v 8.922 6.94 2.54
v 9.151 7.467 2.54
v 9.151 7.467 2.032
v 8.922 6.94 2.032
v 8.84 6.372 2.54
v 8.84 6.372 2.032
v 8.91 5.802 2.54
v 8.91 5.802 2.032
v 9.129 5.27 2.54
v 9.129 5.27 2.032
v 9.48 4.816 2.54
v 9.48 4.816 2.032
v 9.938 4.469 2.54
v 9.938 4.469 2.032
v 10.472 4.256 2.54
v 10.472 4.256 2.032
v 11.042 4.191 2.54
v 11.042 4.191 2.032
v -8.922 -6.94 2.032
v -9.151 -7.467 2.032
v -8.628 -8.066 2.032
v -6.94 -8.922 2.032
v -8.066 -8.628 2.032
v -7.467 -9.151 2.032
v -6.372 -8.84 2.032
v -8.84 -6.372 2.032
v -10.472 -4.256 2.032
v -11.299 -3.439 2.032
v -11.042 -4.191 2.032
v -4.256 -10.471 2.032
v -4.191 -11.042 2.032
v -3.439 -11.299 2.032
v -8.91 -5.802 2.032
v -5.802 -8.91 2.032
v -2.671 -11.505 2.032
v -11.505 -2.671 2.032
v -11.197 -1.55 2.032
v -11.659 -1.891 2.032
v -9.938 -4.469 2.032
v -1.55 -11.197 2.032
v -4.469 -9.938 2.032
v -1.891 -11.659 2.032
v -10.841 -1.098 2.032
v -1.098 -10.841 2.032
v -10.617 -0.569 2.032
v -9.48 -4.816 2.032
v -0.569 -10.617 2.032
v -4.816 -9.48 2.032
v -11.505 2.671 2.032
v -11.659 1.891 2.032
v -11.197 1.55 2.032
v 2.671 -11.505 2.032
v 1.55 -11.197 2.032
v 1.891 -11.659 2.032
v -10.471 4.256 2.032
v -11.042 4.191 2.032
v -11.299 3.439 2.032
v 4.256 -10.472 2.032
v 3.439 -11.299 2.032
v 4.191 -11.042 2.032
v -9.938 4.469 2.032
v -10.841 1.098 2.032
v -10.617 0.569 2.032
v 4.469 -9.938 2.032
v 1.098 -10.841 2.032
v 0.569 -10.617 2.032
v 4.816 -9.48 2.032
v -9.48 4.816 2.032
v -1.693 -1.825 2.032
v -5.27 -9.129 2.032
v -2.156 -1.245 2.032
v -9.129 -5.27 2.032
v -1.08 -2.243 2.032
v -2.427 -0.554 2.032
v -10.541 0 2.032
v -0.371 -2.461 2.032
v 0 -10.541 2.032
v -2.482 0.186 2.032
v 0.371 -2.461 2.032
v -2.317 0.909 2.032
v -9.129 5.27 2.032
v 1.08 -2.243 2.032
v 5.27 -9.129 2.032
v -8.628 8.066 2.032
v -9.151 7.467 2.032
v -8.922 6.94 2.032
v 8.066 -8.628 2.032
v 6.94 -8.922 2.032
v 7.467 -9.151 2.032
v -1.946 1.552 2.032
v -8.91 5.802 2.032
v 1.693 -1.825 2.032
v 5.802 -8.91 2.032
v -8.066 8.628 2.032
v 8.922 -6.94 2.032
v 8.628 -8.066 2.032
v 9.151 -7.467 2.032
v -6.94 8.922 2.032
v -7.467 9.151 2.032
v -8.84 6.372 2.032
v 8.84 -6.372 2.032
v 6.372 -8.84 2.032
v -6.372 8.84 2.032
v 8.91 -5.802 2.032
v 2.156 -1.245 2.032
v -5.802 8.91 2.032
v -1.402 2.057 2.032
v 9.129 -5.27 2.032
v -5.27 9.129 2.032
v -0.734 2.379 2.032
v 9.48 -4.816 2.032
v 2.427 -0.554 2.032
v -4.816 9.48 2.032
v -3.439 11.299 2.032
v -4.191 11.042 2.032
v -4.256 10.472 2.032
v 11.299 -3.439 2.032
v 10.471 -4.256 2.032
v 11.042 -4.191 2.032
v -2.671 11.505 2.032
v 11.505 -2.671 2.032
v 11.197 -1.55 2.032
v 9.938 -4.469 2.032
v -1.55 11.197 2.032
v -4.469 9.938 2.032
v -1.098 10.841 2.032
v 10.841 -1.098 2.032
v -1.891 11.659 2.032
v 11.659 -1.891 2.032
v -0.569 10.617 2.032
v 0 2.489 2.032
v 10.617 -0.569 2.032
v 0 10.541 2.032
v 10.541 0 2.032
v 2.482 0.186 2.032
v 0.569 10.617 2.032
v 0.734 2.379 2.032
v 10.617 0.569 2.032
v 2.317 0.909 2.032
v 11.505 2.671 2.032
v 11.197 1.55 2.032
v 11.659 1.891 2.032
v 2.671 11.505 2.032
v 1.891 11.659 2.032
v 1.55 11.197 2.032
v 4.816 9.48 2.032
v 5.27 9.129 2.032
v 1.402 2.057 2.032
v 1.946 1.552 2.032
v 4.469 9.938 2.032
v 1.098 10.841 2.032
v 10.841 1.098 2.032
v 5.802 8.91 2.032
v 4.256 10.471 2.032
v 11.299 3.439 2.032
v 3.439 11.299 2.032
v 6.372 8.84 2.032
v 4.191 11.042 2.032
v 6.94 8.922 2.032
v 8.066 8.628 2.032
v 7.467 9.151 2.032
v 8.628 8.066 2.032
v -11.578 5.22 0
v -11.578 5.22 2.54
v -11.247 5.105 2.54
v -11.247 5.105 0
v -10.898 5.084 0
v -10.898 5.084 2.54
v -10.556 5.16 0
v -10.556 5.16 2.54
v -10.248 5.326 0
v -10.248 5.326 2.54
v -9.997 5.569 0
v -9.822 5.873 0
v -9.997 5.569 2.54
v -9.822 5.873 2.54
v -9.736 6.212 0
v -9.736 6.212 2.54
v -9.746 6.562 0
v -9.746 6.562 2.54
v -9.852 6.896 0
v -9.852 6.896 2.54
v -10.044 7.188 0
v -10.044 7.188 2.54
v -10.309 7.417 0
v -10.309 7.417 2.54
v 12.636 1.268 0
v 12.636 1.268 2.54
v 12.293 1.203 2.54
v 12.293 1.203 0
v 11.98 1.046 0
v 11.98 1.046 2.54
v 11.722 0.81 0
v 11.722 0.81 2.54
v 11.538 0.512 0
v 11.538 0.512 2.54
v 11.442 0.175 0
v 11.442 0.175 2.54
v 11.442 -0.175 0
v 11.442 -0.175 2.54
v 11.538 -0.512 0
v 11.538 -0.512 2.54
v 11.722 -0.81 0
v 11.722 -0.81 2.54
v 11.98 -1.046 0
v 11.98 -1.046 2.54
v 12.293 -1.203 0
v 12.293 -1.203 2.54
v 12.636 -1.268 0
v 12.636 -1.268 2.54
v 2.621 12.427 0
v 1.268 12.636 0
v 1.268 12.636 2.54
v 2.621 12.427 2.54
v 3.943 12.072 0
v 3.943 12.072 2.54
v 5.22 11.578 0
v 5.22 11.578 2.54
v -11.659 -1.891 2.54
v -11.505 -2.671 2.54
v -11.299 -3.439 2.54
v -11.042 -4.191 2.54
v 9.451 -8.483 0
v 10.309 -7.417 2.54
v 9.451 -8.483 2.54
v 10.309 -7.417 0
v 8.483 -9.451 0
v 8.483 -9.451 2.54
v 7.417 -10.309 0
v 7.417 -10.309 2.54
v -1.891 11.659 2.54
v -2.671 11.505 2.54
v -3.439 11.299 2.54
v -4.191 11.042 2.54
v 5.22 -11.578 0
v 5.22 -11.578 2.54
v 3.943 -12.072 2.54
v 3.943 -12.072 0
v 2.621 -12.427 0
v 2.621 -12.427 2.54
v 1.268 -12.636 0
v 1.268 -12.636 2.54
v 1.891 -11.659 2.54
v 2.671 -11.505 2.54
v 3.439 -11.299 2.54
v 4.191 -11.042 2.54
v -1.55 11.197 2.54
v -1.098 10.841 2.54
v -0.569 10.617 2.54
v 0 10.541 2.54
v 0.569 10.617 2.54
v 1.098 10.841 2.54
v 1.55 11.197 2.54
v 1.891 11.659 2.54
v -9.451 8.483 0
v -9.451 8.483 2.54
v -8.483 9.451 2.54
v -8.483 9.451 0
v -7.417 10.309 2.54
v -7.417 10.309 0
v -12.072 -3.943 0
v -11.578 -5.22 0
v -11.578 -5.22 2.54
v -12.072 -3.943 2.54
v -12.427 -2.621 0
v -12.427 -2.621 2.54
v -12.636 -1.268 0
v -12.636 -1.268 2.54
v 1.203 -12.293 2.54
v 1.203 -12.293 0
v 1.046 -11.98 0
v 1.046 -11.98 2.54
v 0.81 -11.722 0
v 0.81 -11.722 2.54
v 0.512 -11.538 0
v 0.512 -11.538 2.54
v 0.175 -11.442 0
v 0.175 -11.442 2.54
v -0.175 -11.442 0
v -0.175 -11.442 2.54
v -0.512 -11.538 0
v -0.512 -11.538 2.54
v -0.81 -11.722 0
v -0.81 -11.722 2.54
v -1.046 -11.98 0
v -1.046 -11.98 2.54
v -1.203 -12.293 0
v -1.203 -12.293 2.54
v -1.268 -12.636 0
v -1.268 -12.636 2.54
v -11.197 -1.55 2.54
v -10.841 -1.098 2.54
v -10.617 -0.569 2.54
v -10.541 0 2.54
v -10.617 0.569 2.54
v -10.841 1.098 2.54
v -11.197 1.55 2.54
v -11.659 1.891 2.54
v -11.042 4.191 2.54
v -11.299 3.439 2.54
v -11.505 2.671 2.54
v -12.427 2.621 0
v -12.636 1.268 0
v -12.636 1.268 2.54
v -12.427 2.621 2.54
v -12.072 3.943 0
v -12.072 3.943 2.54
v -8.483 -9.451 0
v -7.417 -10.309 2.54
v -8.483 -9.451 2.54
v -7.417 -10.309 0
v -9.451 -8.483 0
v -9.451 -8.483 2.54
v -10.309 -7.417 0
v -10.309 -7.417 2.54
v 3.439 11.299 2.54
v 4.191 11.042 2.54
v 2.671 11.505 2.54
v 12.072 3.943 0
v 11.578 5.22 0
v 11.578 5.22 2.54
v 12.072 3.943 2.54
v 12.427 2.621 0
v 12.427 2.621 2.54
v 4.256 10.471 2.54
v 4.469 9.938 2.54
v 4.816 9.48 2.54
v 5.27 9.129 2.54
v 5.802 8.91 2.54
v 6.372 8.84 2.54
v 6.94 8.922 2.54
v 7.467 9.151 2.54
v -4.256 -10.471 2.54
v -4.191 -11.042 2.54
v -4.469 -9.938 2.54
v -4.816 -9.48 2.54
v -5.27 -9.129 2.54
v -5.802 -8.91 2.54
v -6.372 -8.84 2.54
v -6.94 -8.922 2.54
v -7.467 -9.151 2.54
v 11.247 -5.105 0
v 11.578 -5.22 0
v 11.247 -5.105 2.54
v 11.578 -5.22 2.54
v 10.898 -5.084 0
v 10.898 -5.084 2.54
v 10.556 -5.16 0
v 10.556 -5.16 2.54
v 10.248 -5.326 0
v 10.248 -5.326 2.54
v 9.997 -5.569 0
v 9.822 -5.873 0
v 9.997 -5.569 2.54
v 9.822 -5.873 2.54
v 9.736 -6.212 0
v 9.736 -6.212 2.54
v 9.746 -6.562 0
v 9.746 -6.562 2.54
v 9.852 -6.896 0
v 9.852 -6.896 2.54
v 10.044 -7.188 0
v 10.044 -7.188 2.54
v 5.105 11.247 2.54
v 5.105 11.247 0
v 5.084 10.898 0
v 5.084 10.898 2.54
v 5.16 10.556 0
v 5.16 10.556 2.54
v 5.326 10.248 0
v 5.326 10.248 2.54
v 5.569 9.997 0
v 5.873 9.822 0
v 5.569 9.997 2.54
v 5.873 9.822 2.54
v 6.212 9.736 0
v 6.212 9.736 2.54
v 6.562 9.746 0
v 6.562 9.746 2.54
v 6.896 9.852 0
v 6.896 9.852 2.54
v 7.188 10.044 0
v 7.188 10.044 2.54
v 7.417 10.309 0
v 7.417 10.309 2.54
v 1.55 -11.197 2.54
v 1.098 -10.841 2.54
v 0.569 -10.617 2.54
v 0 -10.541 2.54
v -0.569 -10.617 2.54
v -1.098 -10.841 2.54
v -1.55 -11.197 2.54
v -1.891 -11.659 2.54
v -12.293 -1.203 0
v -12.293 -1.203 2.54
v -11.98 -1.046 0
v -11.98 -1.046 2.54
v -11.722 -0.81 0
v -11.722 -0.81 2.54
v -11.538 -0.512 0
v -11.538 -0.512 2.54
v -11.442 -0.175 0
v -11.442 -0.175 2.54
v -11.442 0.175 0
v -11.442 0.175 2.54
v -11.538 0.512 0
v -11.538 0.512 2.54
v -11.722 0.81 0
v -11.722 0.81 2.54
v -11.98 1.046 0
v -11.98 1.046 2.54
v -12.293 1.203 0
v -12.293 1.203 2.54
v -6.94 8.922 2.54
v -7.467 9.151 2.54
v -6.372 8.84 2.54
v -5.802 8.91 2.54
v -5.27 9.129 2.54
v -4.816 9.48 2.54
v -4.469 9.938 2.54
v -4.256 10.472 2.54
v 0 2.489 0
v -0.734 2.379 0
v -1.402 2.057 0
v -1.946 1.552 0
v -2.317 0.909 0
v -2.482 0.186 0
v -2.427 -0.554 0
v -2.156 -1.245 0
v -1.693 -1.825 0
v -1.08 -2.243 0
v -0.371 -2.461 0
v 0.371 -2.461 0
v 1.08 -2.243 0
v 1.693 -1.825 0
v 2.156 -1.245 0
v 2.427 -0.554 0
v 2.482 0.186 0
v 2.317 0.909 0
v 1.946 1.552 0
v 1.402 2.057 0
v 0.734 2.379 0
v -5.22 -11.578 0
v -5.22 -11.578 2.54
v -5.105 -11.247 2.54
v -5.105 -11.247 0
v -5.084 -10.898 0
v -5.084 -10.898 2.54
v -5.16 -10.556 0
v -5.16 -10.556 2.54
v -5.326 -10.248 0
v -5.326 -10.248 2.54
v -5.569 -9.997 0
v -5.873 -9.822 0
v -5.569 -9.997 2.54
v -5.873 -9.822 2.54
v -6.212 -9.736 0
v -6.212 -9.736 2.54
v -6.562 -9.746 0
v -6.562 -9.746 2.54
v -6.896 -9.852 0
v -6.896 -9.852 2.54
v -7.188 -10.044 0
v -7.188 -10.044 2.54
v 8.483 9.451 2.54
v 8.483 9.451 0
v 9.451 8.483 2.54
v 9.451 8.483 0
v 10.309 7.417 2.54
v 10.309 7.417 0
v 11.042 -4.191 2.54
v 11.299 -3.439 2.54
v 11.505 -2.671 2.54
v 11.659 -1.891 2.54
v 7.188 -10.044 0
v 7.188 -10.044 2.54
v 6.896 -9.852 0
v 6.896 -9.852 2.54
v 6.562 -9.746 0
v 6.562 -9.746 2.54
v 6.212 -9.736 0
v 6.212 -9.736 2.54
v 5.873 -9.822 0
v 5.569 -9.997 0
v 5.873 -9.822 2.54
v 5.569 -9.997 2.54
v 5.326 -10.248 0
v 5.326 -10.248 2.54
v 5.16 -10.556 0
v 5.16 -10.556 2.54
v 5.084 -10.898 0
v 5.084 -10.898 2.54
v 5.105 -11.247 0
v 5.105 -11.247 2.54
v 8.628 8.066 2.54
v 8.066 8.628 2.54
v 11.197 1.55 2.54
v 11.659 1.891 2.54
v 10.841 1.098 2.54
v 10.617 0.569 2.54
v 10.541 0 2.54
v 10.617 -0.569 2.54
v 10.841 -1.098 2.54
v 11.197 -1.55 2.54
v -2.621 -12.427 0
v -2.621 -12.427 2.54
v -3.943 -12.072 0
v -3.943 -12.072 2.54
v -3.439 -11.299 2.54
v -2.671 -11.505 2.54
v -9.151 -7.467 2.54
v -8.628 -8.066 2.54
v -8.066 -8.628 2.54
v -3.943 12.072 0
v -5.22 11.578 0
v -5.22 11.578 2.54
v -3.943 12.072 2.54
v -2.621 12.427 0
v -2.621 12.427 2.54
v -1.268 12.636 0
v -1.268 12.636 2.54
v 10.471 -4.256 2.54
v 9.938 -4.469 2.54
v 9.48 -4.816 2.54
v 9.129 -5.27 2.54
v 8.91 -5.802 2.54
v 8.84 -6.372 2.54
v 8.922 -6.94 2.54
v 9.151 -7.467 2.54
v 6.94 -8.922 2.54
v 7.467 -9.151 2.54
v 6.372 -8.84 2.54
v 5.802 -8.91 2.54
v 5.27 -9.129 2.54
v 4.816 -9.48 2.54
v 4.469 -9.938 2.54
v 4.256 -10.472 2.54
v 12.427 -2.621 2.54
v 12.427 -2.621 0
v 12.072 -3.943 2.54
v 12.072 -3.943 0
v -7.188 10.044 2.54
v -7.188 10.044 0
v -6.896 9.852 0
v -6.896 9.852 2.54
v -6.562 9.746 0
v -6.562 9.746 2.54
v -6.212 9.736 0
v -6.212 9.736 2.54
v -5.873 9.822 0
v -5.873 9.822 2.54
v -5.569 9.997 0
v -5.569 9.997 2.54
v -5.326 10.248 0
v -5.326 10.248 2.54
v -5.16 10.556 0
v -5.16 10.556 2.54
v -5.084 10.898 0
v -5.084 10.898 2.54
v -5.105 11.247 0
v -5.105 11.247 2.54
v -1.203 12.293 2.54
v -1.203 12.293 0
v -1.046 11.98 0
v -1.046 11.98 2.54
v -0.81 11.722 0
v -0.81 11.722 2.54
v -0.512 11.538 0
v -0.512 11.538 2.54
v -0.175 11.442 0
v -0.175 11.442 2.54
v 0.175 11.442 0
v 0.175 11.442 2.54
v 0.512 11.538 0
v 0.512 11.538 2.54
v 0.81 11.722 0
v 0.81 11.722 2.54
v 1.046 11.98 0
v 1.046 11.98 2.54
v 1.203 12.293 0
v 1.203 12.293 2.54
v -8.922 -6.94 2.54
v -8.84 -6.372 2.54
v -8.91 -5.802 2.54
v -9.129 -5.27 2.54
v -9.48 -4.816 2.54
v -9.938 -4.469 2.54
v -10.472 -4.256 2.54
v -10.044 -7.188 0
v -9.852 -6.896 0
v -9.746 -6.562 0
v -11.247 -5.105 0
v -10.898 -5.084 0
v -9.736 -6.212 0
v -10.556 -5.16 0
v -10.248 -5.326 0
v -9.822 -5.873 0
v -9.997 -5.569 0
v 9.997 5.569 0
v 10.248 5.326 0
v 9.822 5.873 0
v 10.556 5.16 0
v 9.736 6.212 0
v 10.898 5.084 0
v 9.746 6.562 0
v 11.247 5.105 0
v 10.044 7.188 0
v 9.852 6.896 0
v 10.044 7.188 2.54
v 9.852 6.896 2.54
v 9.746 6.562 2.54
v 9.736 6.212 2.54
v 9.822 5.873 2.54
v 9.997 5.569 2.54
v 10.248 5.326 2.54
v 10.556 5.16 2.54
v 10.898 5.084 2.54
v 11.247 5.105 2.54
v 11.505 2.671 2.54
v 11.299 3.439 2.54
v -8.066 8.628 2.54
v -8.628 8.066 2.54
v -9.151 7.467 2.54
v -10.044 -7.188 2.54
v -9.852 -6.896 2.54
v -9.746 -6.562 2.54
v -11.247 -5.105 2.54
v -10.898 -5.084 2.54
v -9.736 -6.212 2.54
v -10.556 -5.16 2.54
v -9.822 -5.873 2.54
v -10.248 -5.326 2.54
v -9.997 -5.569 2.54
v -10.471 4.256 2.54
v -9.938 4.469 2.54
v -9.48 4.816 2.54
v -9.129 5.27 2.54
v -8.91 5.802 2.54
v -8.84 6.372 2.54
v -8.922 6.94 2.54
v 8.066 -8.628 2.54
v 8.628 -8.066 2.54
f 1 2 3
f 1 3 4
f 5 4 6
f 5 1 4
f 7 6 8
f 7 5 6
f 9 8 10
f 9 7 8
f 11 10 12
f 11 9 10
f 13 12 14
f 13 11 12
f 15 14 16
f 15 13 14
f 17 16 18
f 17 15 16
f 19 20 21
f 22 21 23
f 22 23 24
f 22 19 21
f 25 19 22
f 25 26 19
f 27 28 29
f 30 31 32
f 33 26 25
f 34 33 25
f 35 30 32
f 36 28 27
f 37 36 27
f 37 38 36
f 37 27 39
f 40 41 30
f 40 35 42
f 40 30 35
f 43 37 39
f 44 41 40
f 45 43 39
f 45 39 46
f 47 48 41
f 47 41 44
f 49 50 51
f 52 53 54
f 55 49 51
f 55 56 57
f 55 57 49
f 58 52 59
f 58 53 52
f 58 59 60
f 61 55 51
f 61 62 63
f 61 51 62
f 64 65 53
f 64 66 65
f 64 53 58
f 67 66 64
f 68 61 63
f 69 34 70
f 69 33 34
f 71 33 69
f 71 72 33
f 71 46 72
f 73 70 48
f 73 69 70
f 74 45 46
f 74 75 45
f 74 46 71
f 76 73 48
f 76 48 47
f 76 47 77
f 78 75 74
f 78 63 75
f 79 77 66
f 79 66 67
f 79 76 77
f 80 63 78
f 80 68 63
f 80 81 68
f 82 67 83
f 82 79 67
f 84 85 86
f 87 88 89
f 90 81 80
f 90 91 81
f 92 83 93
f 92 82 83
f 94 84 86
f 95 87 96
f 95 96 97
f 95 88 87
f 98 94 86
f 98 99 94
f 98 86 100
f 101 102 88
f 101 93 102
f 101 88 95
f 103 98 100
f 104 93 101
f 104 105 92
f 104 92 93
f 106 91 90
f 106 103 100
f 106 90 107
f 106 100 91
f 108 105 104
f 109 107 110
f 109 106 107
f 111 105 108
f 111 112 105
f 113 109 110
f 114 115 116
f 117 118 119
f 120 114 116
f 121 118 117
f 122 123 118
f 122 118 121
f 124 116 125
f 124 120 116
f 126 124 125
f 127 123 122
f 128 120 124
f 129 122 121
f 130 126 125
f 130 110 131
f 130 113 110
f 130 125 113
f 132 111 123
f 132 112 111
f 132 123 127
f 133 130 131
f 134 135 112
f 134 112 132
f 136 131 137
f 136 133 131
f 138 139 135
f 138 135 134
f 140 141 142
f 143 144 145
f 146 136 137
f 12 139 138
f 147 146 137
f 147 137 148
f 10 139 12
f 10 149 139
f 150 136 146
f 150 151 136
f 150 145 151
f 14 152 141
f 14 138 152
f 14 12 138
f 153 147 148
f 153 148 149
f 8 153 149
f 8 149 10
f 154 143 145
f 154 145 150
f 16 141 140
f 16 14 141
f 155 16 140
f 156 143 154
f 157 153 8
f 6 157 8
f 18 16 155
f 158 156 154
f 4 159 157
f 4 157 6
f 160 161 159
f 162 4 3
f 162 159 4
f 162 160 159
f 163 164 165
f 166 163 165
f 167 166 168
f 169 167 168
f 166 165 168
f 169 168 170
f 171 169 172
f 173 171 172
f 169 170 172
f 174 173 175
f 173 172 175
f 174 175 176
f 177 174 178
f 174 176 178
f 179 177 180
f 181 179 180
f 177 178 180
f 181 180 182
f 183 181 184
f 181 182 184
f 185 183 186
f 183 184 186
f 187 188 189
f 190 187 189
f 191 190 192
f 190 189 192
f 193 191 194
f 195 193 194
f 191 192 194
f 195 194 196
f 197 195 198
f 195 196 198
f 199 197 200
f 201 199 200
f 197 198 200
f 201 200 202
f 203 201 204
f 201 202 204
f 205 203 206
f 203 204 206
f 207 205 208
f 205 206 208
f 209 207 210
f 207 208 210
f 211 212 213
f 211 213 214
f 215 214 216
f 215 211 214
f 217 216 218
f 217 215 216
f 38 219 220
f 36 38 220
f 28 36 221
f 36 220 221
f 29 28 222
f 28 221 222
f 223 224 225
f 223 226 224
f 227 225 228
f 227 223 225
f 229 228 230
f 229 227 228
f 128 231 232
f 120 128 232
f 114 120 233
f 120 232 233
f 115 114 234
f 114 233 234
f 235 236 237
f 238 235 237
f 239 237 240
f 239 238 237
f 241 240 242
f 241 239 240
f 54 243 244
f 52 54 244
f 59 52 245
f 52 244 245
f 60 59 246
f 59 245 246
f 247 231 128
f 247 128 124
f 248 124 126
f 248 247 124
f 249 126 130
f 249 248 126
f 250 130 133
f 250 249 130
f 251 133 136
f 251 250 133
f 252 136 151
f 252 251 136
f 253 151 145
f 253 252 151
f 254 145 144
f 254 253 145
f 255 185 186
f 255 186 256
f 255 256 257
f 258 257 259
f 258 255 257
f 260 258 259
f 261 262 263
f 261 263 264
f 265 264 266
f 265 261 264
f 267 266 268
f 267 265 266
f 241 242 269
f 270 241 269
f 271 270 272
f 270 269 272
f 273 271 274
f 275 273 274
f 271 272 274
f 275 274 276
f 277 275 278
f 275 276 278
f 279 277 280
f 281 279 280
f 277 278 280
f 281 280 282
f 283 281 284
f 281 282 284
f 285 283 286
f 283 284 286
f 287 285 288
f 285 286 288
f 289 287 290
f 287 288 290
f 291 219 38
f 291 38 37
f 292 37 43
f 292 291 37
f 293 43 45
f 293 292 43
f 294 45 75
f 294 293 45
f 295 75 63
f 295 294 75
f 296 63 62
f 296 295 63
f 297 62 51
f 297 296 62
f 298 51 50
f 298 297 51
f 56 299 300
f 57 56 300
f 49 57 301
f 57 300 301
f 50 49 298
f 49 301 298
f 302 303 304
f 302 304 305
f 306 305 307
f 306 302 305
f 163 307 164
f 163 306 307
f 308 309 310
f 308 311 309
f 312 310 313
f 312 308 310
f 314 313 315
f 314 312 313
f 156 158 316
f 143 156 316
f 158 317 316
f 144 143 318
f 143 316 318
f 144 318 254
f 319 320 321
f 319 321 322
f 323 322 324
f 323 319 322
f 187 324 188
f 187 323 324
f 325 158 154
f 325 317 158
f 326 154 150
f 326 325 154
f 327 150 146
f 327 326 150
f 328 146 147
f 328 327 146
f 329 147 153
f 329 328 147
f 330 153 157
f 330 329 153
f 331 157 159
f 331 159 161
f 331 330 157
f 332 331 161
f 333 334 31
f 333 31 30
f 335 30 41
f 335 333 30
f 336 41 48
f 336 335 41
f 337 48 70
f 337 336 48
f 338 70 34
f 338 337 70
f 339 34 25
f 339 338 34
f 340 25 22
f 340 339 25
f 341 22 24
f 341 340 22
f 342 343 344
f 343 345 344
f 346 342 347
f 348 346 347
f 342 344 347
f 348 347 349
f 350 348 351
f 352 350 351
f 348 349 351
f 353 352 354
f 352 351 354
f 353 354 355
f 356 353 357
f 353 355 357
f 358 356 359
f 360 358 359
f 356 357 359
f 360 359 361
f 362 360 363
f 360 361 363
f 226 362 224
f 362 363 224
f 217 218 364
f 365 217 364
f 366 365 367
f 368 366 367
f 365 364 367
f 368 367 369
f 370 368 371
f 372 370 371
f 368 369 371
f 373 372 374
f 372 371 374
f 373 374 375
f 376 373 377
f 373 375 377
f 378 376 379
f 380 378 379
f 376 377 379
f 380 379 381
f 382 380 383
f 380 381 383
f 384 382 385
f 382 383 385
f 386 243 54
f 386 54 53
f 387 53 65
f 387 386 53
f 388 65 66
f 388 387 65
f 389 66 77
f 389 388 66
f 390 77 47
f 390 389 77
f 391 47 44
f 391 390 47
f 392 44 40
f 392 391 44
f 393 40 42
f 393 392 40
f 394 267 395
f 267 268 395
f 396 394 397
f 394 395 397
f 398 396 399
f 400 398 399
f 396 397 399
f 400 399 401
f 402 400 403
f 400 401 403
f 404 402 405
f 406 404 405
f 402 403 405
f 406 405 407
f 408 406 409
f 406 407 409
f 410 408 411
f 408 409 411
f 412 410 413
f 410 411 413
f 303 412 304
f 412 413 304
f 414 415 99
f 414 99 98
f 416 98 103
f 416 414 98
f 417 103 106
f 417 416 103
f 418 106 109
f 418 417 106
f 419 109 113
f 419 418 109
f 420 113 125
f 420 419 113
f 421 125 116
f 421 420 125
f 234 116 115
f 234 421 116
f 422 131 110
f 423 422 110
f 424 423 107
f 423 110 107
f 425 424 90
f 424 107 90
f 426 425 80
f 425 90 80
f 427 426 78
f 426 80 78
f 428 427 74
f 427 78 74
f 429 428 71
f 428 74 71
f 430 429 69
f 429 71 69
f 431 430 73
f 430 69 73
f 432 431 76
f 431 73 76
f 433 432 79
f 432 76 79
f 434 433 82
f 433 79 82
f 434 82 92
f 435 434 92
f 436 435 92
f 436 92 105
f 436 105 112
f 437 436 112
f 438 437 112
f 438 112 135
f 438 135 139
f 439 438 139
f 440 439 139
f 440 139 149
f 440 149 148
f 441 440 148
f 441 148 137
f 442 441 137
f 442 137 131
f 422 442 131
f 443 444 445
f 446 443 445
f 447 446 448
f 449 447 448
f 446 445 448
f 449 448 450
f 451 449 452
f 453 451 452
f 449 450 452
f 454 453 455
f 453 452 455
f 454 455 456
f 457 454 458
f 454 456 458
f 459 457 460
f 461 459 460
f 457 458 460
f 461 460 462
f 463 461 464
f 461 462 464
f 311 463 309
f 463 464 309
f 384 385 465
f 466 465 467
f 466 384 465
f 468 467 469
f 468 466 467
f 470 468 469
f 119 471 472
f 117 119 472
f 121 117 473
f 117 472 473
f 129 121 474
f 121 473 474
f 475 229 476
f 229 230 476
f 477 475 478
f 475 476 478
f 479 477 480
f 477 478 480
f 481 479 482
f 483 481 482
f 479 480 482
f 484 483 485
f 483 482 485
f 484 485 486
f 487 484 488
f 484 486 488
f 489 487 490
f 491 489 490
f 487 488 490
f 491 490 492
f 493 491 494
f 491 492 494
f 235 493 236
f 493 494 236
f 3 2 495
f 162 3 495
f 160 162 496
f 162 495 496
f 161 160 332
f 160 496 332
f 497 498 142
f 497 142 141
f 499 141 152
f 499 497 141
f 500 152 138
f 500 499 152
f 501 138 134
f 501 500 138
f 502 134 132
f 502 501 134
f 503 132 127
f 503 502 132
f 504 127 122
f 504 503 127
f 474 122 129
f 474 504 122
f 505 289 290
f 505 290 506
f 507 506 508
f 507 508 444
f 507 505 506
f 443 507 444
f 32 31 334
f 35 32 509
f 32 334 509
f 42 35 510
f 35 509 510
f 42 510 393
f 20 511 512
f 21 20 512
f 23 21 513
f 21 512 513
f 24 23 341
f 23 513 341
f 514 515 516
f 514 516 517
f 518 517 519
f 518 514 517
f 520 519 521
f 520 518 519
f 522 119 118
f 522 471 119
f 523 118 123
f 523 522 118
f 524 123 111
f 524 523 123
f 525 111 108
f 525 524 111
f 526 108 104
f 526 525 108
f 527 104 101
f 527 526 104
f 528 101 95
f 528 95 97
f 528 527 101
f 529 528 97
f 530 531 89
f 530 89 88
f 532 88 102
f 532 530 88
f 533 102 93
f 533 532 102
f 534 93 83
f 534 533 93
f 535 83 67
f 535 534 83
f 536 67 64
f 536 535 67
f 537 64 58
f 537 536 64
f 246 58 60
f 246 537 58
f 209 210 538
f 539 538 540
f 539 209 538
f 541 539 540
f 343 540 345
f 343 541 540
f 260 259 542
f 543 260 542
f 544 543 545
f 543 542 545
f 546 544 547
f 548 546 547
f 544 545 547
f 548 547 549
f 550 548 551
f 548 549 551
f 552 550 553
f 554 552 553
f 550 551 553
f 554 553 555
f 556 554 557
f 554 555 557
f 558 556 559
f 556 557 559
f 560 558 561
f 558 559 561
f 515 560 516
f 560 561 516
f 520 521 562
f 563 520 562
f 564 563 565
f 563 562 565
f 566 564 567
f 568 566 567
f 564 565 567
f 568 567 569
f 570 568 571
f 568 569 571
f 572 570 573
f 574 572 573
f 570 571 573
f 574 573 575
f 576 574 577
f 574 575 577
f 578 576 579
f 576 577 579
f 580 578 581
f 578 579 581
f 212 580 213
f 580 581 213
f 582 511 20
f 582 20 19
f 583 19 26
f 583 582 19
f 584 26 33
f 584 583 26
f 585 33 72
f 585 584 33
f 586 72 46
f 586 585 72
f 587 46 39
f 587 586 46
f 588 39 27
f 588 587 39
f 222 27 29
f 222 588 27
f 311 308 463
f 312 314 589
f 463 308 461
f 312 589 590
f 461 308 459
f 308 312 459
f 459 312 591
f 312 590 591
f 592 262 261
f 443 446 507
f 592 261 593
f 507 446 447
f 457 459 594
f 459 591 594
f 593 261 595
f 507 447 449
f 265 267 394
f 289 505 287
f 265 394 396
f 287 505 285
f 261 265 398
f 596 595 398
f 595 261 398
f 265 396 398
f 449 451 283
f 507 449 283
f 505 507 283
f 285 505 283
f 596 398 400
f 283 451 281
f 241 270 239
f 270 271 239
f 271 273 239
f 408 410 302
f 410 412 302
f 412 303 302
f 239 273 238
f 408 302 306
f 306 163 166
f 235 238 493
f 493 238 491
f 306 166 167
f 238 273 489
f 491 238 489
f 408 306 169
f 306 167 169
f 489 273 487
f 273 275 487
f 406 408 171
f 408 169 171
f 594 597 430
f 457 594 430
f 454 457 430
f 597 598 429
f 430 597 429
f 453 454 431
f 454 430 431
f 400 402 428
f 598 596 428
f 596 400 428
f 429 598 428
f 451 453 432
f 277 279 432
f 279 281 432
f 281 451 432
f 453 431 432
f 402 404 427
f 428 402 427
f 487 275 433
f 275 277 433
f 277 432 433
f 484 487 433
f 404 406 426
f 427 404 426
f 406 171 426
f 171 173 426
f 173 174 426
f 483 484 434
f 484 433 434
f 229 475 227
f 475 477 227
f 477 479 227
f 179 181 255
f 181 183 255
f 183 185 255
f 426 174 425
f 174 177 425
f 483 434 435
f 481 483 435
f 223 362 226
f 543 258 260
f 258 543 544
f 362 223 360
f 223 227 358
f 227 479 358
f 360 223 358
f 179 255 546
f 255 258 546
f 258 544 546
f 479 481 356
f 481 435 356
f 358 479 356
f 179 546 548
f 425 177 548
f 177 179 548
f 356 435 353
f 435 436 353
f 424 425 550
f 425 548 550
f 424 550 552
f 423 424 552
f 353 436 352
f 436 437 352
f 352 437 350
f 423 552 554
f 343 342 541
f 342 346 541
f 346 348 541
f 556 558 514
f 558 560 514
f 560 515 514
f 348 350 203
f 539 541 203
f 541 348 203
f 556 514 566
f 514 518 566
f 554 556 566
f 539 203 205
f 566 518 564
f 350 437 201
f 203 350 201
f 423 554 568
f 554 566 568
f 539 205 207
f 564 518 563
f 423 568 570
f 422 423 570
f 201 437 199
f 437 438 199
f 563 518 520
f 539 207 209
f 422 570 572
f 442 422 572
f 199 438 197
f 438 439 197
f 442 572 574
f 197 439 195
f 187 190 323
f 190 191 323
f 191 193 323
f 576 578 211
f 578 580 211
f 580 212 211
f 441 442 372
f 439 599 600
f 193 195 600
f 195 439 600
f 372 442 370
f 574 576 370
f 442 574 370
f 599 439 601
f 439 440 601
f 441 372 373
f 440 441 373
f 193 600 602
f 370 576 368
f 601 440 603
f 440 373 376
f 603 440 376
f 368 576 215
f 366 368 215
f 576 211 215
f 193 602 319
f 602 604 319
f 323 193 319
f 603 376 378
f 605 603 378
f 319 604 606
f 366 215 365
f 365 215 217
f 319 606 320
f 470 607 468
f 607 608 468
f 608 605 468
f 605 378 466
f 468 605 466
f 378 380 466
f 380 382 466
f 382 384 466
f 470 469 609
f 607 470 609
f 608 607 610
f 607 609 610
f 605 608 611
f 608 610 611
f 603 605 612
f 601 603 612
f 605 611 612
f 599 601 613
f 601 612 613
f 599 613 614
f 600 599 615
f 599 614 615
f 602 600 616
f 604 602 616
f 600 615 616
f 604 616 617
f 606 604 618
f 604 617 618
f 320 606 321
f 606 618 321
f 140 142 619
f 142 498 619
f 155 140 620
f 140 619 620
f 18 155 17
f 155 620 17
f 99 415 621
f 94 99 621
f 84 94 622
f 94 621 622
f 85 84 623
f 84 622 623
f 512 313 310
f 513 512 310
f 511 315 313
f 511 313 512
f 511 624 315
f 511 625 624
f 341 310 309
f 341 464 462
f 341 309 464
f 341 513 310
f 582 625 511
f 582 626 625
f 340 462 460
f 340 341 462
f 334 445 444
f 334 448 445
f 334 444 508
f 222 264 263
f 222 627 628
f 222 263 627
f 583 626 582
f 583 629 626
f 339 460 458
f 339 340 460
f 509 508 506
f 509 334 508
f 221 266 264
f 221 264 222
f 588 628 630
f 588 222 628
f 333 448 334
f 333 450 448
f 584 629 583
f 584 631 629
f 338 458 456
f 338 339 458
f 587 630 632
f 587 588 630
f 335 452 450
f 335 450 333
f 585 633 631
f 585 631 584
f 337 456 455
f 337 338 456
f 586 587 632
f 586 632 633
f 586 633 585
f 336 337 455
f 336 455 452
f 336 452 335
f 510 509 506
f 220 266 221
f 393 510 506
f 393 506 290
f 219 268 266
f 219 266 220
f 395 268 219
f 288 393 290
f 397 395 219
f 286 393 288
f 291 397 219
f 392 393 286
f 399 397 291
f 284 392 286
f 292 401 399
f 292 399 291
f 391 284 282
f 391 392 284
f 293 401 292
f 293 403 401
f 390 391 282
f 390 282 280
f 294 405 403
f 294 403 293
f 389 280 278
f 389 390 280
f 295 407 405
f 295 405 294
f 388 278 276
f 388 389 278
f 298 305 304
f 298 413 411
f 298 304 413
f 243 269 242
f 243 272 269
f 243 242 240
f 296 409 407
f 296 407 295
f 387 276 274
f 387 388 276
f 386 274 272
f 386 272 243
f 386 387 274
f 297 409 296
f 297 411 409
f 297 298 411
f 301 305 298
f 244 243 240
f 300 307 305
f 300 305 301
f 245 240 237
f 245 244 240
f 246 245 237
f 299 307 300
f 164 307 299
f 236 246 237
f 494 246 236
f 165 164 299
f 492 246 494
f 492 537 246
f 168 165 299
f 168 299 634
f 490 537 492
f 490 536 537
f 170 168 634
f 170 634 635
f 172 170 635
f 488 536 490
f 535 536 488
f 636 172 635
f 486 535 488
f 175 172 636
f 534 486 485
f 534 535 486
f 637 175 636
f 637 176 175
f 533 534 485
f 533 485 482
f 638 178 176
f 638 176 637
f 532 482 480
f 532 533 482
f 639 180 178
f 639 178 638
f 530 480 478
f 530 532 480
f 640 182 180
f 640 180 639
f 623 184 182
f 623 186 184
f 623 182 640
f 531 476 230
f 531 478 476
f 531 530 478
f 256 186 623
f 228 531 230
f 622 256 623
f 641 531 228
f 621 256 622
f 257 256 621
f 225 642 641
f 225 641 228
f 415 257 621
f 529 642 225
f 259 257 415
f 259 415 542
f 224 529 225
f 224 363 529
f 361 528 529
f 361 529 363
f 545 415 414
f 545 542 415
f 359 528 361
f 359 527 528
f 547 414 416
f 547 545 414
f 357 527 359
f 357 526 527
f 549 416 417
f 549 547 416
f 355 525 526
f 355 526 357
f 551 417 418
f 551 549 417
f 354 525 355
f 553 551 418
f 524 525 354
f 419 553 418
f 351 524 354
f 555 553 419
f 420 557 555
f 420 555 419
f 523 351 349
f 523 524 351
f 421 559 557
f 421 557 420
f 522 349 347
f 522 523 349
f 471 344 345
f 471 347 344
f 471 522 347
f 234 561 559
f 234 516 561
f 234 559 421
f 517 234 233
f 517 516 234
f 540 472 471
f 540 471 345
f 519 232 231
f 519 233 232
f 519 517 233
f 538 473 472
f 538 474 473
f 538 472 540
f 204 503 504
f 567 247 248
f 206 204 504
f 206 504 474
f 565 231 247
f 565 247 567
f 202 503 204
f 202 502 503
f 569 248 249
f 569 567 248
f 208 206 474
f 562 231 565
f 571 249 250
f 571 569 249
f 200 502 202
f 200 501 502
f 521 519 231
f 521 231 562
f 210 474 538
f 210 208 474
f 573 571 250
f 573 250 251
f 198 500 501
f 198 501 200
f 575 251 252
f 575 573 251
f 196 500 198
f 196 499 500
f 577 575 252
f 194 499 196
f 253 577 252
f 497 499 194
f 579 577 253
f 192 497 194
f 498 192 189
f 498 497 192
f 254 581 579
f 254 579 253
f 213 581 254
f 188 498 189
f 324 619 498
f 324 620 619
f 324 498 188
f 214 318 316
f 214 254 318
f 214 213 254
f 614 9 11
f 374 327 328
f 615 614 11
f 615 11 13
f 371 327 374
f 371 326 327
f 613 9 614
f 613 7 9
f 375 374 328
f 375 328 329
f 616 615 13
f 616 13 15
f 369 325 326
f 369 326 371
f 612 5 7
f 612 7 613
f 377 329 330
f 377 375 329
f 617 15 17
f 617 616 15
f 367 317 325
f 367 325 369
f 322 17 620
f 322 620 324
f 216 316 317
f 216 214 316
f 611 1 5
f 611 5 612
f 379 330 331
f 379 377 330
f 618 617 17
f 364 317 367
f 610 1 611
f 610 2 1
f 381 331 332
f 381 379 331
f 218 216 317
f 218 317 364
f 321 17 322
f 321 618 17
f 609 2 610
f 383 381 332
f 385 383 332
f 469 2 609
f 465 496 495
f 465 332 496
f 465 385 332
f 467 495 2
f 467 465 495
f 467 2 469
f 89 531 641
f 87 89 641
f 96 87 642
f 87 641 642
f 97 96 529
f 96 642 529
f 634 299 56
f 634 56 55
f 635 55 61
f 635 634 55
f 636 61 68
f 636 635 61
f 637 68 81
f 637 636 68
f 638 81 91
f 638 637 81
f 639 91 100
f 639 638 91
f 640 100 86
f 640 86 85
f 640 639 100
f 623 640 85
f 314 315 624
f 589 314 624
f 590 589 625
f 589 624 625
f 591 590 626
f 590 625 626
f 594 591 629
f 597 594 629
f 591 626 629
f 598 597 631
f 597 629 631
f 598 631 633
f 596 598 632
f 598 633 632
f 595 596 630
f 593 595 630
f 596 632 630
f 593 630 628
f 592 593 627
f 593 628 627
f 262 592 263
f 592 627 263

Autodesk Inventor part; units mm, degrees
ref_plane "YZ Plane" through (0, 0, 0) normal (1, 0, 0) x (0, 1, 0)
ref_plane "XZ Plane" through (0, 0, 0) normal (0, 1, 0) x (-1, 0, 0)
ref_plane "XY Plane" through (0, 0, 0) normal (0, 0, 1) x (1, 0, 0)
sketch "Sketch1" plane through (0, 0, 0) normal (0, 0, 1) x (1, 0, 0)
  circle A0 centre (0, 0) radius 12.7
  dimension "d9" = 25.4
extrude "Extrusion1" add sketch "Sketch1" along normal blind 2.54
sketch "Sketch2" plane through (0, 0, 2.54) normal (0, 0, 1) x (1, 0, 0)
  circle A0 centre (0, 12.7) radius 1.27
  dimension "d12" = 2.54
extrude "Extrusion2" cut sketch "Sketch2" against normal through all
pattern_circular "Circular Pattern1" count 12 over 360 about axis through (0, 0, 0) along (0, 0, 1) of "Extrusion2"
sketch "Sketch3" plane through (0, 0, 2.54) normal (0, 0, 1) x (1, 0, 0)
  arc A0 (5.2198, 11.5777) -> (7.4167, 10.3093) centre (6.35, 10.9985) ccw
  arc A1 (5.2198, 11.5777) -> (1.2684, 12.6365) centre (0, 0) ccw
  arc A2 (-1.2684, 12.6365) -> (1.2684, 12.6365) centre (0, 12.7) ccw
  arc A3 (-1.2684, 12.6365) -> (-5.2198, 11.5777) centre (0, 0) ccw
  arc A4 (-7.4167, 10.3093) -> (-5.2198, 11.5777) centre (-6.35, 10.9985) ccw
  arc A5 (-7.4167, 10.3093) -> (-10.3093, 7.4167) centre (0, 0) ccw
  arc A6 (-11.5777, 5.2198) -> (-10.3093, 7.4167) centre (-10.9985, 6.35) ccw
  arc A7 (-11.5777, 5.2198) -> (-12.6365, 1.2684) centre (0, 0) ccw
  arc A8 (-12.6365, -1.2684) -> (-12.6365, 1.2684) centre (-12.7, 0) ccw
  arc A9 (-12.6365, -1.2684) -> (-11.5777, -5.2198) centre (0, 0) ccw
  arc A10 (-10.3093, -7.4167) -> (-11.5777, -5.2198) centre (-10.9985, -6.35) ccw
  arc A11 (-10.3093, -7.4167) -> (-7.4167, -10.3093) centre (0, 0) ccw
  arc A12 (-5.2198, -11.5777) -> (-7.4167, -10.3093) centre (-6.35, -10.9985) ccw
  arc A13 (-5.2198, -11.5777) -> (-1.2684, -12.6365) centre (0, 0) ccw
  arc A14 (1.2684, -12.6365) -> (-1.2684, -12.6365) centre (0, -12.7) ccw
  arc A15 (1.2684, -12.6365) -> (5.2198, -11.5777) centre (0, 0) ccw
  arc A16 (7.4167, -10.3093) -> (5.2198, -11.5777) centre (6.35, -10.9985) ccw
  arc A17 (7.4167, -10.3093) -> (10.3093, -7.4167) centre (0, 0) ccw
  arc A18 (11.5777, -5.2198) -> (10.3093, -7.4167) centre (10.9985, -6.35) ccw
  arc A19 (11.5777, -5.2198) -> (12.6365, -1.2684) centre (0, 0) ccw
  arc A20 (12.6365, 1.2684) -> (12.6365, -1.2684) centre (12.7, 0) ccw
  arc A21 (12.6365, 1.2684) -> (11.5777, 5.2198) centre (0, 0) ccw
  arc A22 (10.3093, 7.4167) -> (11.5777, 5.2198) centre (10.9985, 6.35) ccw
  arc A23 (10.3093, 7.4167) -> (7.4167, 10.3093) centre (0, 0) ccw
  arc A24 (-1.8912, 11.6586) -> (-4.1914, 11.0423) centre (0, 0) ccw
  arc A25 (-1.8912, 11.6586) -> (1.8912, 11.6586) centre (0, 12.7) ccw
  arc A26 (4.1914, 11.0423) -> (1.8912, 11.6586) centre (0, 0) ccw
  arc A27 (4.1914, 11.0423) -> (7.4672, 9.151) centre (6.35, 10.9985) ccw
  arc A28 (9.151, 7.4672) -> (7.4672, 9.151) centre (0, 0) ccw
  arc A29 (9.151, 7.4672) -> (11.0423, 4.1914) centre (10.9985, 6.35) ccw
  arc A30 (11.6586, 1.8912) -> (11.0423, 4.1914) centre (0, 0) ccw
  arc A31 (11.6586, 1.8912) -> (11.6586, -1.8912) centre (12.7, 0) ccw
  arc A32 (11.0423, -4.1914) -> (11.6586, -1.8912) centre (0, 0) ccw
  arc A33 (11.0423, -4.1914) -> (9.151, -7.4672) centre (10.9985, -6.35) ccw
  arc A34 (7.4672, -9.151) -> (9.151, -7.4672) centre (0, 0) ccw
  arc A35 (7.4672, -9.151) -> (4.1914, -11.0423) centre (6.35, -10.9985) ccw
  arc A36 (1.8912, -11.6586) -> (4.1914, -11.0423) centre (0, 0) ccw
  arc A37 (1.8912, -11.6586) -> (-1.8912, -11.6586) centre (0, -12.7) ccw
  arc A38 (-4.1914, -11.0423) -> (-1.8912, -11.6586) centre (0, 0) ccw
  arc A39 (-4.1914, -11.0423) -> (-7.4672, -9.151) centre (-6.35, -10.9985) ccw
  arc A40 (-9.151, -7.4672) -> (-7.4672, -9.151) centre (0, 0) ccw
  arc A41 (-9.151, -7.4672) -> (-11.0423, -4.1914) centre (-10.9985, -6.35) ccw
  arc A42 (-11.6586, -1.8912) -> (-11.0423, -4.1914) centre (0, 0) ccw
  arc A43 (-11.6586, -1.8912) -> (-11.6586, 1.8912) centre (-12.7, 0) ccw
  arc A44 (-11.0423, 4.1914) -> (-11.6586, 1.8912) centre (0, 0) ccw
  arc A45 (-11.0423, 4.1914) -> (-9.151, 7.4672) centre (-10.9985, 6.35) ccw
  arc A46 (-7.4672, 9.151) -> (-9.151, 7.4672) centre (0, 0) ccw
  arc A47 (-7.4672, 9.151) -> (-4.1914, 11.0423) centre (-6.35, 10.9985) ccw
  dimension "d18" = 0.889
extrude "Extrusion3" cut sketch "Sketch3" against normal blind 0.508 contours A25 A26 A27 A28 A29 A30 A31 A32 A33 A34 A35 A36 A37 A38 A39 A40 A41 A42 A43 A44 A45 A46 A47 A24
hole "Hole1" at (0, 0, 0) direction (0, 0, 1) diameter 4.9784 end through all
properties part number "Tripod_Wheel" material "Polypropylene"
